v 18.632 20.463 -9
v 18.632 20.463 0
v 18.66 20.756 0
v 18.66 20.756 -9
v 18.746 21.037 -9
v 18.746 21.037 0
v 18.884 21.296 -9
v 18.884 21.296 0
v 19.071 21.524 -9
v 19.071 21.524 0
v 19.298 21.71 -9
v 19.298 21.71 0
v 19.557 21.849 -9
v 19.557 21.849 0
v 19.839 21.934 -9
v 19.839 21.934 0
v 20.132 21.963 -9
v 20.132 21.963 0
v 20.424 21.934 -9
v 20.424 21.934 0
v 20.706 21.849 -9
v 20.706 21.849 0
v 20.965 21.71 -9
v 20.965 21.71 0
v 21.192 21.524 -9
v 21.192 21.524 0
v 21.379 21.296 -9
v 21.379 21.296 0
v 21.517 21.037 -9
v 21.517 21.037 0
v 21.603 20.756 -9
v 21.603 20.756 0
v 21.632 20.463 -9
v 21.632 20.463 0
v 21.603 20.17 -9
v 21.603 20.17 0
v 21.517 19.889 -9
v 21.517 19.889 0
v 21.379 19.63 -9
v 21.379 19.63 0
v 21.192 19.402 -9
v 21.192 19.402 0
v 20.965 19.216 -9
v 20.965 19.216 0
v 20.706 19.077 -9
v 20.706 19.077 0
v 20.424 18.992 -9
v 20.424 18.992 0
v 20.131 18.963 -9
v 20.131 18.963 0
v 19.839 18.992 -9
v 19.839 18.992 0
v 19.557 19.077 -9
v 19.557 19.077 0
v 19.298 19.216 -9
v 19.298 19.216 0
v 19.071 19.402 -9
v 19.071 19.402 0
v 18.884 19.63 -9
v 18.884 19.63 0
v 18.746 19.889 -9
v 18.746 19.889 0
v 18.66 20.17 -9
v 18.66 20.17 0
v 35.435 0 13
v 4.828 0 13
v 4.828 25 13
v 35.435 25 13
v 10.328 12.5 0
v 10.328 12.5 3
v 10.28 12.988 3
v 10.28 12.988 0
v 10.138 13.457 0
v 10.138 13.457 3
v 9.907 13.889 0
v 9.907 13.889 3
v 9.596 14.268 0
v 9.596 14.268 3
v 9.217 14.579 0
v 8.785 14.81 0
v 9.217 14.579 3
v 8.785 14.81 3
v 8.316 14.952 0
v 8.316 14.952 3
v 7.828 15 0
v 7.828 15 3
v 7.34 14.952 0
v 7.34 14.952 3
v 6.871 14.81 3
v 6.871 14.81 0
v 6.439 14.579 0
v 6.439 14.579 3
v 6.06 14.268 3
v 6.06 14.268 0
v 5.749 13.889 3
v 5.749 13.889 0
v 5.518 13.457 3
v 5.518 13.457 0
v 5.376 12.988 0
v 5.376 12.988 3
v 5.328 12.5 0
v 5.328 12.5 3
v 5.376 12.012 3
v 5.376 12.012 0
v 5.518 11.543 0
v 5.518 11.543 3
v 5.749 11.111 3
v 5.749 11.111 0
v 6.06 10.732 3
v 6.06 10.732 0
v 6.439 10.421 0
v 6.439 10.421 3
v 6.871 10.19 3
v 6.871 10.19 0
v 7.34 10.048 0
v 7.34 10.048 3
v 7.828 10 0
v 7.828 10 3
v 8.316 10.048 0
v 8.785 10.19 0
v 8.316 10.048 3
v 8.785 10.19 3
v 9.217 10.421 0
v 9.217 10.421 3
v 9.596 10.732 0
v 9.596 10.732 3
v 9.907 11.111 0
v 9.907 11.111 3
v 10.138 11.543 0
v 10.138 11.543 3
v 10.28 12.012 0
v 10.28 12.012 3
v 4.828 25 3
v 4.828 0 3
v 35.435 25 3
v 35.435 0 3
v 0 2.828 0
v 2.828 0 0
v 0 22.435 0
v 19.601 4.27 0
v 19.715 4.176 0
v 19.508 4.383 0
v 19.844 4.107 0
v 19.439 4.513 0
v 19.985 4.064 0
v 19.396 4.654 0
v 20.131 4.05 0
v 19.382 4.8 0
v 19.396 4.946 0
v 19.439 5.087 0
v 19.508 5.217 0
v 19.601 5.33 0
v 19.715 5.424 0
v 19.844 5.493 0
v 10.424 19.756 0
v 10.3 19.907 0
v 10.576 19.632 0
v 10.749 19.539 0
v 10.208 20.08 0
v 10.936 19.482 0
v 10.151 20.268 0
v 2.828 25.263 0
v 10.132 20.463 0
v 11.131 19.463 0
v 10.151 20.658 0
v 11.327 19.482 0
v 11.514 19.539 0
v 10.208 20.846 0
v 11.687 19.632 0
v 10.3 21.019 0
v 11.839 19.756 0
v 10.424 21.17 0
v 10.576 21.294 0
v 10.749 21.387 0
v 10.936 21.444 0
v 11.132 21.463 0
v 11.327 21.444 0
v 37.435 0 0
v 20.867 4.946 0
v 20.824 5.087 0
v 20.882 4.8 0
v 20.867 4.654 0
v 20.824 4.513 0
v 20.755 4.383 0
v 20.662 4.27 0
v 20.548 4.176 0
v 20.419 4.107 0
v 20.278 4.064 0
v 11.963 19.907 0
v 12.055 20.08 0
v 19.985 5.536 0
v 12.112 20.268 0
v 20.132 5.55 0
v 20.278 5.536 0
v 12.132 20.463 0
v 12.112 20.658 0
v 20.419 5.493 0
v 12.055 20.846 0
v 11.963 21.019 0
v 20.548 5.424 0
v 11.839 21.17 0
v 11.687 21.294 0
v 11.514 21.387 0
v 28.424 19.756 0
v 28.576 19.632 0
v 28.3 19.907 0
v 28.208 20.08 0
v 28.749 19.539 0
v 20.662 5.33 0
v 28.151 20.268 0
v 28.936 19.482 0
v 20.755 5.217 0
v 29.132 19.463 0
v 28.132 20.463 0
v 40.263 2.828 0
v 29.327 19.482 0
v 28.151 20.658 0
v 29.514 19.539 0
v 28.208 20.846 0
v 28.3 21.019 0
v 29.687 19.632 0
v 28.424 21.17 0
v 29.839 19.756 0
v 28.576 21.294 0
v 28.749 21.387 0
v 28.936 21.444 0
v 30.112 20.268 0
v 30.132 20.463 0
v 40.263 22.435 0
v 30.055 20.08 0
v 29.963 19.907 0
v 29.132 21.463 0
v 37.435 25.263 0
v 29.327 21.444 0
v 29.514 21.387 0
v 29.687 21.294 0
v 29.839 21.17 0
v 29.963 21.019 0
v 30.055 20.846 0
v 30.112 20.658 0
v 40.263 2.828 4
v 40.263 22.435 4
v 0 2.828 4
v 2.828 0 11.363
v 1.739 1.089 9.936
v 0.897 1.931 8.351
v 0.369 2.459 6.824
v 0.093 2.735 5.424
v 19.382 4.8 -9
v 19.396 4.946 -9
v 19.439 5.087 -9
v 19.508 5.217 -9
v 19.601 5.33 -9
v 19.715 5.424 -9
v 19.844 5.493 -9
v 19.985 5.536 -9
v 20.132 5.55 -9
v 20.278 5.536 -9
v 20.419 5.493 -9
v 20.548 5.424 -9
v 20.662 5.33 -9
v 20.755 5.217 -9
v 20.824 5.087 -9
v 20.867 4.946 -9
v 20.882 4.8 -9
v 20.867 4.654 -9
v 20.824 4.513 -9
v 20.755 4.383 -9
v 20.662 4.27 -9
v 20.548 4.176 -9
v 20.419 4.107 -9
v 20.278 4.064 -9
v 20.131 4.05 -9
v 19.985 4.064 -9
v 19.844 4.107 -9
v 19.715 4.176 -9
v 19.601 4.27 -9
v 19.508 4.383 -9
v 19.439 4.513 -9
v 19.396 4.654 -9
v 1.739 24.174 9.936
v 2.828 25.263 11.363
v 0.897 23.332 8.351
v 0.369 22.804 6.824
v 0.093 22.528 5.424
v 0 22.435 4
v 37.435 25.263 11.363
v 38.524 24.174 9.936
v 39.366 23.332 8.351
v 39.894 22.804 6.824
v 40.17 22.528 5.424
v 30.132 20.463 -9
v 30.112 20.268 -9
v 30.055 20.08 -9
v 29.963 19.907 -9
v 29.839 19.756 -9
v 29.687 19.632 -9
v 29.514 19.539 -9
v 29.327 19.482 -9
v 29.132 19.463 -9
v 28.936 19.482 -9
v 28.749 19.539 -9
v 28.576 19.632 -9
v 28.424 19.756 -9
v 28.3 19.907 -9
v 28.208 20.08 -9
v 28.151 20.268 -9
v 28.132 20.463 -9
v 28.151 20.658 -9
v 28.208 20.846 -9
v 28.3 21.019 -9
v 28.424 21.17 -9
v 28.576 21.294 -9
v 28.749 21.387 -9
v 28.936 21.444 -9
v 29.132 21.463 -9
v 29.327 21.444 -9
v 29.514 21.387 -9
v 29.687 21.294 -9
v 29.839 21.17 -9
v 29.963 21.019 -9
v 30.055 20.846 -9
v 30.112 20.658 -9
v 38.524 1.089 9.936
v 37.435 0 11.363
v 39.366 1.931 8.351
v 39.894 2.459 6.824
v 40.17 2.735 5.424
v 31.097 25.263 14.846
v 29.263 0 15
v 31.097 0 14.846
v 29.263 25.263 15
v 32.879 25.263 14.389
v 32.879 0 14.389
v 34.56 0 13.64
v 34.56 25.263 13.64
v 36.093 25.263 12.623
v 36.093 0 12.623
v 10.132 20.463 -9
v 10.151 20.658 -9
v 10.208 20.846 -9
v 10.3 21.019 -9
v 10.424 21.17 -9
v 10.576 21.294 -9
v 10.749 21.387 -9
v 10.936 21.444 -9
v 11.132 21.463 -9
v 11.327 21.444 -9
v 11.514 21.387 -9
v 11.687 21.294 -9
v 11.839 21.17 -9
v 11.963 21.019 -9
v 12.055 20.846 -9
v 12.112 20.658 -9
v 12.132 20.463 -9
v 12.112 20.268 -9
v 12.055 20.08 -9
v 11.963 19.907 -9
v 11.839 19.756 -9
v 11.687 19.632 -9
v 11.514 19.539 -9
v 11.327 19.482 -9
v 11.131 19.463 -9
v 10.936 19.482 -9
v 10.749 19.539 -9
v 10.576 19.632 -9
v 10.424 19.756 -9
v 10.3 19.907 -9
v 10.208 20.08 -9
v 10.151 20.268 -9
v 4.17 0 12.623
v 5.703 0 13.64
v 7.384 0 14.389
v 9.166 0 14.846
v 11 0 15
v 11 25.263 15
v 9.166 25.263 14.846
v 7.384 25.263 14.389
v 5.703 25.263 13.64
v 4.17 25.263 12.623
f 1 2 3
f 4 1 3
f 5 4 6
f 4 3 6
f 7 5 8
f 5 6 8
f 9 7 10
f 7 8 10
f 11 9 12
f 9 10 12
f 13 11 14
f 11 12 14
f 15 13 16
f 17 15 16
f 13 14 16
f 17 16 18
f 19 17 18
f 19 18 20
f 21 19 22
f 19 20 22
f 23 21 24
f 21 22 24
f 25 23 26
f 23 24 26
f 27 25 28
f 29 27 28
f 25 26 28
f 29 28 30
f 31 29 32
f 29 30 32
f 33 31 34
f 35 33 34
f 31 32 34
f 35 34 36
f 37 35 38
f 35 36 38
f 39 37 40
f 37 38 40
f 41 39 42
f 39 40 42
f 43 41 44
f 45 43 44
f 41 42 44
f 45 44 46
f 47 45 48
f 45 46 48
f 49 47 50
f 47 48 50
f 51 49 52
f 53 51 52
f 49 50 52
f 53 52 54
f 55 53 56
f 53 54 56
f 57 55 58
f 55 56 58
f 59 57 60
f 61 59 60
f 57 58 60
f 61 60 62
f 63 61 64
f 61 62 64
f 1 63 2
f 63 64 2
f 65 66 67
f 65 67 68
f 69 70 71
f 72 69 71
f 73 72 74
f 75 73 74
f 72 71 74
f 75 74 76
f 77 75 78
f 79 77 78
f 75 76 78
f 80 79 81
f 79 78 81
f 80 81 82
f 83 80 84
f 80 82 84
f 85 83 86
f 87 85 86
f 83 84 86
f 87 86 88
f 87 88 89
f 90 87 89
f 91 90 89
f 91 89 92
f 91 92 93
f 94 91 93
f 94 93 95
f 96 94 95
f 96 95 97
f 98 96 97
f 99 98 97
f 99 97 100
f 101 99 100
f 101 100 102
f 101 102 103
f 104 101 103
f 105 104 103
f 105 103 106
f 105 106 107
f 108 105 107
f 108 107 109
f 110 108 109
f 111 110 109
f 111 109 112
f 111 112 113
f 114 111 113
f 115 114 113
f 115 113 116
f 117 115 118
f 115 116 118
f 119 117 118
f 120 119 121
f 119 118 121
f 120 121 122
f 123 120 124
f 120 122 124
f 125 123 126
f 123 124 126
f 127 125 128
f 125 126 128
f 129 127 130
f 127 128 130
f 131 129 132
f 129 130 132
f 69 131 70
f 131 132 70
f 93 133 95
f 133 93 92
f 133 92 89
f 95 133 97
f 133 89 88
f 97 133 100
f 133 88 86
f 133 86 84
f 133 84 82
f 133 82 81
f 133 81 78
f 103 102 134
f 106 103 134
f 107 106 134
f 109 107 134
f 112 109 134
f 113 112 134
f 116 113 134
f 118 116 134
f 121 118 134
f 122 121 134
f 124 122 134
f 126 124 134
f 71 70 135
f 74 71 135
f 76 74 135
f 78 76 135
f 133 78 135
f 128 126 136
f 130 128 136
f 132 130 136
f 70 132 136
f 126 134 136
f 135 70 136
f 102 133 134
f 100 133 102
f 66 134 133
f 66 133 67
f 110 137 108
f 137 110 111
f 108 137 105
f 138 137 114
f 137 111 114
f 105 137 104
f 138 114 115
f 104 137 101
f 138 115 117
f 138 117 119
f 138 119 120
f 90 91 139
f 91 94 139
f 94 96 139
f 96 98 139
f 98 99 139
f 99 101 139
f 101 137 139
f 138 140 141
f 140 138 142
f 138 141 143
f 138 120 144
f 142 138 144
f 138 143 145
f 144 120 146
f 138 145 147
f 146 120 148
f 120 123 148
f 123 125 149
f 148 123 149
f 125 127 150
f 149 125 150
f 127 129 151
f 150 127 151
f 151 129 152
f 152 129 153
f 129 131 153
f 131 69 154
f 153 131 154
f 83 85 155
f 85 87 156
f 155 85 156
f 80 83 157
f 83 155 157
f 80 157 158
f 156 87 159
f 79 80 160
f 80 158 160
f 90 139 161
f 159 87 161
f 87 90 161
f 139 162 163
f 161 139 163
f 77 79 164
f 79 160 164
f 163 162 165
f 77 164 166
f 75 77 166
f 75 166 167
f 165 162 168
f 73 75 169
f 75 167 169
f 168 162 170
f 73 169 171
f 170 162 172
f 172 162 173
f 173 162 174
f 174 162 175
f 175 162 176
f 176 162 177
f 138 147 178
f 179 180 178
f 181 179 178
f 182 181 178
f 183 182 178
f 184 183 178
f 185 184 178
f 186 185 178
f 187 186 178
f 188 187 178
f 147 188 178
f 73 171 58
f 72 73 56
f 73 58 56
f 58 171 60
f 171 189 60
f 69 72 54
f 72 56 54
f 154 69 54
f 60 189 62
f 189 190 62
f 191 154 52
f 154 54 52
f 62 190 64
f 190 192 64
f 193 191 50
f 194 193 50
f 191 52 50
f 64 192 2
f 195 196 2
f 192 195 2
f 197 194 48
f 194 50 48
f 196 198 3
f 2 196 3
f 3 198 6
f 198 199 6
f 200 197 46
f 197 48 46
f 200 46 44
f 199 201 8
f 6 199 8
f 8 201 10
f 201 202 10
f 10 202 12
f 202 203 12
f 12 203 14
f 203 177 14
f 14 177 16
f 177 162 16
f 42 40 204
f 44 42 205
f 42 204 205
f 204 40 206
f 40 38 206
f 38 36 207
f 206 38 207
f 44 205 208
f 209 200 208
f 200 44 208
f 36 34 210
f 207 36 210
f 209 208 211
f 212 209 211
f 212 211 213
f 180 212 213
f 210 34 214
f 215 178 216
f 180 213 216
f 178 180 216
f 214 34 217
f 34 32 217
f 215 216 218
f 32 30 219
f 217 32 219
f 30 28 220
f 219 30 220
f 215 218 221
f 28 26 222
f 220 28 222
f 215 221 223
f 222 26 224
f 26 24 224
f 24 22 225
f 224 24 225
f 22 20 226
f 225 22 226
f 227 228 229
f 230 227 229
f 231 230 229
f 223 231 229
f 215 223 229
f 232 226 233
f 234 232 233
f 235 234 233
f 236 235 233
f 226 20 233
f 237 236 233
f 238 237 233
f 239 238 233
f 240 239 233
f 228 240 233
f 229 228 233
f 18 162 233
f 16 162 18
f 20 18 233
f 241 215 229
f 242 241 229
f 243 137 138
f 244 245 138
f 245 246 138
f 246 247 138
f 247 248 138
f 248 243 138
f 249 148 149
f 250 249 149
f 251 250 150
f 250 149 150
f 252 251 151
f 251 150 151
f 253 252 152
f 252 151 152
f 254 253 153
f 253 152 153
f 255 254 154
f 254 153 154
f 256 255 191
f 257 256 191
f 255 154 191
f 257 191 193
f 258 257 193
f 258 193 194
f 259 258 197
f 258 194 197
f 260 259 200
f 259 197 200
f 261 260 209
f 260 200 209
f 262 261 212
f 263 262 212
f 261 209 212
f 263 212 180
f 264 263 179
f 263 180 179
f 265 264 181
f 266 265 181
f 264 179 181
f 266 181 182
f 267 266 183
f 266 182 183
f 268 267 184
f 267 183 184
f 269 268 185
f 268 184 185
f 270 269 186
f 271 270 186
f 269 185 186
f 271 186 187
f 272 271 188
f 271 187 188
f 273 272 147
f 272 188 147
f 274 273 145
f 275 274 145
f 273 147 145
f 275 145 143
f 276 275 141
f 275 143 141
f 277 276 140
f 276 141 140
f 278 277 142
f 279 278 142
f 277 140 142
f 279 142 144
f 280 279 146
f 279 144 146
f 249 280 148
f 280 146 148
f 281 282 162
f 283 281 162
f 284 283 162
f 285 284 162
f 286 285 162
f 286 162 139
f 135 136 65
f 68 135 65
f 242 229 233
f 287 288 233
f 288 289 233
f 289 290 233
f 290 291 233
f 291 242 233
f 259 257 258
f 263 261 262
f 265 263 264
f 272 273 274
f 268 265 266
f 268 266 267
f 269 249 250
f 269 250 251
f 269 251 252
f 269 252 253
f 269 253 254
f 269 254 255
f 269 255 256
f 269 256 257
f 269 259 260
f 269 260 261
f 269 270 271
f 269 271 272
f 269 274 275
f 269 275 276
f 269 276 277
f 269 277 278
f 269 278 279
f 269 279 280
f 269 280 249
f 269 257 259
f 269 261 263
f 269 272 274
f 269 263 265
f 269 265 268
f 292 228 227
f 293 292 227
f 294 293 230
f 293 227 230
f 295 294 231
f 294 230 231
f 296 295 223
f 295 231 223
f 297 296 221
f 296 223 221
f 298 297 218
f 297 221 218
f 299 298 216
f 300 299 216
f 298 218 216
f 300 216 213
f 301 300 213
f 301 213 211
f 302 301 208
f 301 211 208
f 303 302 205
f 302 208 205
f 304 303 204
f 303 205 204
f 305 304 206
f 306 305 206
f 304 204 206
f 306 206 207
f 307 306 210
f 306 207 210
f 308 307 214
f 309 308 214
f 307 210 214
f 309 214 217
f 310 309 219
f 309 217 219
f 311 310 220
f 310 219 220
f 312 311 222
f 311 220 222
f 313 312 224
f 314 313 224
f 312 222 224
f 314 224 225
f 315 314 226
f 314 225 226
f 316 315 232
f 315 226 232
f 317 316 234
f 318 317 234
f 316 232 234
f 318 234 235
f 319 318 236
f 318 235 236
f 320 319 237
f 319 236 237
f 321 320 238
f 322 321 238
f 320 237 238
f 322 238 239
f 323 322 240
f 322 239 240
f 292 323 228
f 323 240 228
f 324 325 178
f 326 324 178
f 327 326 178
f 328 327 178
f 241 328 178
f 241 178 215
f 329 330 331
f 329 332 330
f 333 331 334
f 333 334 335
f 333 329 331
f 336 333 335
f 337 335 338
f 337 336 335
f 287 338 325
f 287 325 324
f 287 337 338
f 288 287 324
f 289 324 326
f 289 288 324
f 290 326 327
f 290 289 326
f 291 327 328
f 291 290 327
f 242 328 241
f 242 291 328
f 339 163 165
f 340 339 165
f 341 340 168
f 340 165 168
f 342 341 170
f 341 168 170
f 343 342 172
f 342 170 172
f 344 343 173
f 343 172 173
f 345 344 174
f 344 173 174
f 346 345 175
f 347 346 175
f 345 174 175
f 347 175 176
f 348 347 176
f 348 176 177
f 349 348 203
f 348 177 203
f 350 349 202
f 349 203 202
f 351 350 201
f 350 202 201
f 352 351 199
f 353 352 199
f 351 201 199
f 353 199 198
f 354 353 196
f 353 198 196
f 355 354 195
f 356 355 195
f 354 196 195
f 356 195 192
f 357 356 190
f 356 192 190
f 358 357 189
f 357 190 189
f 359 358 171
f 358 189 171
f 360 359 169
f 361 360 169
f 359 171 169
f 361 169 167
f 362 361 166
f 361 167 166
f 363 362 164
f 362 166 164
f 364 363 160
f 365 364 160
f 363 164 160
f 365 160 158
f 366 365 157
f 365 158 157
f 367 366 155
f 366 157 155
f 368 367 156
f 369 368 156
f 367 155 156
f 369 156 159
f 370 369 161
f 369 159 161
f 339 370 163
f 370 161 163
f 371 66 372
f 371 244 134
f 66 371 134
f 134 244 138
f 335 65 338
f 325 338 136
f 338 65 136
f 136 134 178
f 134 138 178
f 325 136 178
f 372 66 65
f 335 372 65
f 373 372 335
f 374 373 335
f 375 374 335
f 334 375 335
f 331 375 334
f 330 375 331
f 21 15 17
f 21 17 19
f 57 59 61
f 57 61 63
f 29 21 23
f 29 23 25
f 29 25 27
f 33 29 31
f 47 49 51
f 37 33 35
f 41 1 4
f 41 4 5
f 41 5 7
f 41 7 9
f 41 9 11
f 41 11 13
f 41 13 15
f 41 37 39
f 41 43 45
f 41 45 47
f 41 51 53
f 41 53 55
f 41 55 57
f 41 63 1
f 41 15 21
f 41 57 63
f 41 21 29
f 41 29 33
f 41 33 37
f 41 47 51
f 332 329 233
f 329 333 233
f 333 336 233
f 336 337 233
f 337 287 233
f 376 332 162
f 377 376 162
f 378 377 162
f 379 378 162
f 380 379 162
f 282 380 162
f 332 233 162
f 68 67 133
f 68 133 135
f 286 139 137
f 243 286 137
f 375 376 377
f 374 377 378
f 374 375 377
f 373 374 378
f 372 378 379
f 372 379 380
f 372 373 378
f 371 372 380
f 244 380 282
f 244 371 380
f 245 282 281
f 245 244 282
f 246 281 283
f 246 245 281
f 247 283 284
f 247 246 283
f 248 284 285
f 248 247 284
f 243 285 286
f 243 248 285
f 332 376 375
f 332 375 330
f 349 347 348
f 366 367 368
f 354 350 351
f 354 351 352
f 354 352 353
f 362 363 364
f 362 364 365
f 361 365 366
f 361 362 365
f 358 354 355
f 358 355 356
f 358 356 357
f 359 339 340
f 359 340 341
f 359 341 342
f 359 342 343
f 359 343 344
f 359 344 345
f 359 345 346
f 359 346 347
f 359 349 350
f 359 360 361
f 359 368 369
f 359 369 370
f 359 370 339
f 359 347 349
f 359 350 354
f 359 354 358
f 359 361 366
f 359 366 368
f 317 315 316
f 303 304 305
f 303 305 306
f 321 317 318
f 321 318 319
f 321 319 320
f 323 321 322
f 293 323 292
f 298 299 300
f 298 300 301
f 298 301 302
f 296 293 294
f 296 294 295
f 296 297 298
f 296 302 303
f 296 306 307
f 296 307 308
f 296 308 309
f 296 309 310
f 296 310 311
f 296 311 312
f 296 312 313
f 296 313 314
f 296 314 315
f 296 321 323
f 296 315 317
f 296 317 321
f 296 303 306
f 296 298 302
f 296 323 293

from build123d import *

# Parameters (mm, degrees)
F1_DEPTH  = 15
F2_W      = 30.607
F2_H      = 10
F3_DEPTH  = 25
F4_DEPTH  = 20
F6_DEPTH  = 9
F7_DEPTH  = 9
F8_R      = 11
F9_R      = 2.5
F10_DEPTH = 25


# Not quite as in the source:
# - a feature names something its author has since deleted; it is built from what else it names


with BuildPart() as f1:
    # F0 (on Top) → F1 (new body)
    with BuildSketch(Plane.XY):
        Polygon((37.435, 25.263), (2.828, 25.263), (0, 22.435), (0, 2.828), (2.828, 0), (37.435, 0), (40.263, 2.828), (40.263, 22.435), align=None)
    extrude(amount=F1_DEPTH)

    # F2 (on face) → F3 (cut)
    with BuildSketch(Plane.XZ):
        with Locations((20.1315, 8)):
            Rectangle(F2_W, F2_H)
    extrude(amount=-F3_DEPTH, mode=Mode.SUBTRACT)

    # F2 (on face) → F4 (cut)
    with BuildSketch(Plane.XZ):
        with Locations((20.1315, 8)):
            Rectangle(F2_W, F2_H)
    extrude(amount=-F4_DEPTH, mode=Mode.SUBTRACT)

    # F5 (on face) → F6 (join)
    with BuildSketch(Plane(origin=(0, 0, 0), x_dir=(1, 0, 0), z_dir=(0, 0, -1))):
        with BuildLine():
            ThreePointArc((12.1315, -20.463), (11.1315, -19.463), (10.1315, -20.463))
            Line((10.1315, -20.463), (12.1315, -20.463))
        make_face()
        with BuildLine():
            Line((12.1315, -20.463), (10.1315, -20.463))
            ThreePointArc((10.1315, -20.463), (11.1315, -21.463), (12.1315, -20.463))
        make_face()
        with BuildLine():
            Line((18.6315, -20.463), (21.6315, -20.463))
            ThreePointArc((21.6315, -20.463), (20.1315, -18.963), (18.6315, -20.463))
        make_face()
        with BuildLine():
            ThreePointArc((18.6315, -20.463), (20.1315, -21.963), (21.6315, -20.463))
            Line((21.6315, -20.463), (18.6315, -20.463))
        make_face()
        with BuildLine():
            ThreePointArc((28.1315, -20.463), (29.1315, -21.463), (30.1315, -20.463))
            Line((30.1315, -20.463), (28.1315, -20.463))
        make_face()
        with BuildLine():
            Line((28.1315, -20.463), (30.1315, -20.463))
            ThreePointArc((30.1315, -20.463), (29.1315, -19.463), (28.1315, -20.463))
        make_face()
    extrude(amount=F6_DEPTH)

    # F5 (on face) → F7 (join)
    with BuildSketch(Plane(origin=(0, 0, 0), x_dir=(1, 0, 0), z_dir=(0, 0, -1))):
        with BuildLine():
            Line((19.3815, -4.8), (20.8815, -4.8))
            ThreePointArc((20.8815, -4.8), (20.1315, -4.05), (19.3815, -4.8))
        make_face()
        with BuildLine():
            ThreePointArc((19.3815, -4.8), (20.1315, -5.55), (20.8815, -4.8))
            Line((20.8815, -4.8), (19.3815, -4.8))
        make_face()
    extrude(amount=F7_DEPTH)

    # F8
    f8_edges = [f1.edges().sort_by_distance(p)[0] for p in [
        (40.263, 12.6315, 15),
        (0, 12.6315, 15),
    ]]
    fillet(f8_edges, radius=F8_R)

    # F9 (on face) → F10 (cut)
    with BuildSketch(Plane.XY.offset(3)):
        with Locations((7.828, 12.5)):
            Circle(F9_R)
    extrude(amount=-F10_DEPTH, mode=Mode.SUBTRACT)


solid = f1.part
